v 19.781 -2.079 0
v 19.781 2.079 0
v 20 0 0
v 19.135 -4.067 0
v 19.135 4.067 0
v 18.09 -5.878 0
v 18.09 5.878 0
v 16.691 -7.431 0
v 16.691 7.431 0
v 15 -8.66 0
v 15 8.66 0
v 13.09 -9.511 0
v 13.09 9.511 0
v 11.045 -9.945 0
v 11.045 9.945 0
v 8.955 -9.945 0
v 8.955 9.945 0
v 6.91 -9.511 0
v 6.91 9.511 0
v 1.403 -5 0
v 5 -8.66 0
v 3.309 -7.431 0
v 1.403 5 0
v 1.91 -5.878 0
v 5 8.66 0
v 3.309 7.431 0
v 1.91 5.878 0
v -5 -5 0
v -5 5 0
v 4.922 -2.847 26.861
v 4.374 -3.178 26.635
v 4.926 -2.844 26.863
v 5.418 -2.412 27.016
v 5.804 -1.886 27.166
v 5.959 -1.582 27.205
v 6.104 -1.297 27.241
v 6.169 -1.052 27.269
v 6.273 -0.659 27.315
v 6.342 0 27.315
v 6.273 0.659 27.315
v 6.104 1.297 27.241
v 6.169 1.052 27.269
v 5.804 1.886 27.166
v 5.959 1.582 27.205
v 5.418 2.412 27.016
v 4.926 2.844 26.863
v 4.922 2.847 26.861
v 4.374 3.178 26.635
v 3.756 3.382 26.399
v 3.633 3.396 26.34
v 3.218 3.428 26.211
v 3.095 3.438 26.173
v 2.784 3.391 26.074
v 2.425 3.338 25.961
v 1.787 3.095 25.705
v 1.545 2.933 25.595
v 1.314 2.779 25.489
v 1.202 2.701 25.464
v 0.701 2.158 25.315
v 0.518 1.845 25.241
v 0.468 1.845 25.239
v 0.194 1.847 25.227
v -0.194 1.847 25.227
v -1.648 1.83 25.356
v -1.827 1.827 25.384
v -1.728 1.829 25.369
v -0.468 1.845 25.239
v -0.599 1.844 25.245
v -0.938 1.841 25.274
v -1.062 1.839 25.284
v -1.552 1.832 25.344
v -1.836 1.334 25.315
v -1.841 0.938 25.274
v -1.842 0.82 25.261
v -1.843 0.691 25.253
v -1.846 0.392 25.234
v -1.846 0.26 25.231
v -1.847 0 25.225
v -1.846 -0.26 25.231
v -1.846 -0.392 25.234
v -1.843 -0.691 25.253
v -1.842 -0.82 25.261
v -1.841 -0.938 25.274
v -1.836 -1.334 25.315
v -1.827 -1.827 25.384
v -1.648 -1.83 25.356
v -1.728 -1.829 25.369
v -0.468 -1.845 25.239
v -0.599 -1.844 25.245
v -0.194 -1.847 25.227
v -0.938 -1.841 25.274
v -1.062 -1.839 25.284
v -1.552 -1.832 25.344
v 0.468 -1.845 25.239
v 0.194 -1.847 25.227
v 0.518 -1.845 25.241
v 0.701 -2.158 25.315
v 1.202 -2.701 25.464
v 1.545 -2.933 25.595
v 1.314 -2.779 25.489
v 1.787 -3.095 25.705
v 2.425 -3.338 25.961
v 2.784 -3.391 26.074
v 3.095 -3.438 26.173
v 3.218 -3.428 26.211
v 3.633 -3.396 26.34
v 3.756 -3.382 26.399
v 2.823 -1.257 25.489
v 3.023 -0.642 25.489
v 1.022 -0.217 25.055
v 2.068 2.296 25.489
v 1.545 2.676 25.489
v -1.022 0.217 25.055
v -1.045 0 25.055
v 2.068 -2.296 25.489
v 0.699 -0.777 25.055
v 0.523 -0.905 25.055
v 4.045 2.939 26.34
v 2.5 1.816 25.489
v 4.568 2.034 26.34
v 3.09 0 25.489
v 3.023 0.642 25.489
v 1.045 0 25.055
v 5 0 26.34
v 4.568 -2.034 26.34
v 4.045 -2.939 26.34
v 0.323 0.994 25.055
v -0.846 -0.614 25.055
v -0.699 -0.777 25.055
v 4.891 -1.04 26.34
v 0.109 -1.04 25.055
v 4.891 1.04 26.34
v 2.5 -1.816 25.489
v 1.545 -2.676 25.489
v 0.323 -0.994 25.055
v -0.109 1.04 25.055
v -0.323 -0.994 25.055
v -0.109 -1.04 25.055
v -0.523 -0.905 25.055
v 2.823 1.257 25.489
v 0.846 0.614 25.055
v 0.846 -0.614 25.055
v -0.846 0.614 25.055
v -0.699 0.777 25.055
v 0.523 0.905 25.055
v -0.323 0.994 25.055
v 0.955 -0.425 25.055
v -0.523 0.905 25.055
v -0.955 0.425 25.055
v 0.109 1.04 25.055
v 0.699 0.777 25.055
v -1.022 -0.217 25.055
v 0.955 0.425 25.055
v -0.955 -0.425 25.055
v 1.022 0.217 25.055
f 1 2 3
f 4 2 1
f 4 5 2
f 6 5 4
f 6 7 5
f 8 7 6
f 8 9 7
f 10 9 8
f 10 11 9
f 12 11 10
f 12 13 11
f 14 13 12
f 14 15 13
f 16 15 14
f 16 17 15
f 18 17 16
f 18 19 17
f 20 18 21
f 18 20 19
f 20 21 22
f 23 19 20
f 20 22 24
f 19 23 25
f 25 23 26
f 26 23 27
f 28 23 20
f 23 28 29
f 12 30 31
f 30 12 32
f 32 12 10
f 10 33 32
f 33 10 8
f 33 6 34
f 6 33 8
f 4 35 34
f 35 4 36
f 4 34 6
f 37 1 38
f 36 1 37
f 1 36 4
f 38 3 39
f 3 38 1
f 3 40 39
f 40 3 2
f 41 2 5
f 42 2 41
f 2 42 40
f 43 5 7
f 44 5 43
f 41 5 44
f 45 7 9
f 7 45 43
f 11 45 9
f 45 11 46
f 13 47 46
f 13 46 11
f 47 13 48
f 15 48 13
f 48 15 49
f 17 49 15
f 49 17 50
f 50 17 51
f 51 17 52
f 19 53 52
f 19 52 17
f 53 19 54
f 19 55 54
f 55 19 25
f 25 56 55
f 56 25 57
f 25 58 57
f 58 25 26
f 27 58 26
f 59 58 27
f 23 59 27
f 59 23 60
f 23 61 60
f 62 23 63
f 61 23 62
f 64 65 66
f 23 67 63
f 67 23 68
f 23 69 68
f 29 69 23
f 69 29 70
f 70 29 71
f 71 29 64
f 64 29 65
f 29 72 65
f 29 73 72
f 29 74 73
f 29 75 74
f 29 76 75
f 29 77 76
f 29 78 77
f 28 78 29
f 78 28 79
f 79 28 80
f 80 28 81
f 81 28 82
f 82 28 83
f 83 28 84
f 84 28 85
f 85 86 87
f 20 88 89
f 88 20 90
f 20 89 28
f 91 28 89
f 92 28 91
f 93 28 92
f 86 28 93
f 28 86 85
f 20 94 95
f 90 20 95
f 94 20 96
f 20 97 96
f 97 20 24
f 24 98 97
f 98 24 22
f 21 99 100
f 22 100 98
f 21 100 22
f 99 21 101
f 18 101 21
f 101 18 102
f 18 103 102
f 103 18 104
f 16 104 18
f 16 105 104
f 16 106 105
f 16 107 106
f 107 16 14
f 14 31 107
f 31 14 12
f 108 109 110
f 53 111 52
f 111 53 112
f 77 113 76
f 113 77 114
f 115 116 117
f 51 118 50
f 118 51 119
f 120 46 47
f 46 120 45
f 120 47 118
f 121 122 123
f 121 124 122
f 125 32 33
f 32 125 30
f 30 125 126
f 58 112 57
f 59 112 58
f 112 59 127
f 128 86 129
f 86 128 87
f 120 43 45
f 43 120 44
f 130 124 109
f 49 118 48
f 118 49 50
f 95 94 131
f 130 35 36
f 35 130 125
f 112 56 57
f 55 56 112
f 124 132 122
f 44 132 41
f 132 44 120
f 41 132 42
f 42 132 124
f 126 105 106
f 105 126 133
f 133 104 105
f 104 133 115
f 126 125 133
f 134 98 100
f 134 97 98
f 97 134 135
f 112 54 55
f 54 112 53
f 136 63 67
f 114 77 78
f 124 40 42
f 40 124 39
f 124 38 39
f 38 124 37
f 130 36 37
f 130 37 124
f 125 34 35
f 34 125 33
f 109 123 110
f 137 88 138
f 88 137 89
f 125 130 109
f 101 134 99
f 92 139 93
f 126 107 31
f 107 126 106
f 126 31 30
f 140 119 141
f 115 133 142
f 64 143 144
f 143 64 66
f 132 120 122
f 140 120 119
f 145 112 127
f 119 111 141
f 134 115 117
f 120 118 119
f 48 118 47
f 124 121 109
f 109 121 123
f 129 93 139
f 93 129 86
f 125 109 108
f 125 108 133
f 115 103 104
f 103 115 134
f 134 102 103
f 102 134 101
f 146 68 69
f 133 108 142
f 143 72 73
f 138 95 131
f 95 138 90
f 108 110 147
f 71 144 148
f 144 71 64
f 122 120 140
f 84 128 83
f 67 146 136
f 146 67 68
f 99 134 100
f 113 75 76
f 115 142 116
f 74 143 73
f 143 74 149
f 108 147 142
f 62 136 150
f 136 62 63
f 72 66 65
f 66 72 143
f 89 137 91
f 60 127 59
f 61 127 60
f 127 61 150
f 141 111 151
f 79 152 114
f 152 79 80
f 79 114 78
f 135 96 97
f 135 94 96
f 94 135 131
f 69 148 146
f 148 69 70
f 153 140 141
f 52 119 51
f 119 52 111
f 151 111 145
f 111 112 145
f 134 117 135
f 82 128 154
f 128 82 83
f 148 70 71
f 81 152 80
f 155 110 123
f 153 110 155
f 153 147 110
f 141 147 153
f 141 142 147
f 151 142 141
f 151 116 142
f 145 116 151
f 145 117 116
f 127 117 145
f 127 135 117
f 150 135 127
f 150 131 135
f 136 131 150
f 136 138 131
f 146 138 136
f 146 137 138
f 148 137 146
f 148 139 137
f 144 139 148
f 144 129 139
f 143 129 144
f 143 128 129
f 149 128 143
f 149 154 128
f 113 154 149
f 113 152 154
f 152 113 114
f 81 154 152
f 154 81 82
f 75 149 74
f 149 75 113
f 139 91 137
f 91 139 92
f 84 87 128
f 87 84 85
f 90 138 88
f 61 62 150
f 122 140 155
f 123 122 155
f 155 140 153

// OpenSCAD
difference() {
    linear_extrude(height=40, scale=[0, 0]) {
        square(10, center=true);
        translate([10,0]) circle(10);
    }
 translate([0,0,35])   sphere(10);
}

/*
Test case ideas:
o off-center starting point
o Concave polygon
o Disjoint polygons
o multi-rotation twist
o zero scales, zero scales in only one axis (for the above cases)
o boolean operations on scaled extrusion (including zero scale)
*/
